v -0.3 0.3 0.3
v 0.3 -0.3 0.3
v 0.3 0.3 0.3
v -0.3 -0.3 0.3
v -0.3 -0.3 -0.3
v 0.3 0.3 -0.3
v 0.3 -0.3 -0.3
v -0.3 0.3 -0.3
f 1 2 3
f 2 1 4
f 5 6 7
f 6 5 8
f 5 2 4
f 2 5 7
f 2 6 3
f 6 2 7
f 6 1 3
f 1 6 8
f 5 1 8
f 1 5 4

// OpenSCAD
use <lib.scad>

module thing() {
	box([0.6,0.6,0.6]);
}

hd = 72;
ld = 8;

thing($fn=hd);
